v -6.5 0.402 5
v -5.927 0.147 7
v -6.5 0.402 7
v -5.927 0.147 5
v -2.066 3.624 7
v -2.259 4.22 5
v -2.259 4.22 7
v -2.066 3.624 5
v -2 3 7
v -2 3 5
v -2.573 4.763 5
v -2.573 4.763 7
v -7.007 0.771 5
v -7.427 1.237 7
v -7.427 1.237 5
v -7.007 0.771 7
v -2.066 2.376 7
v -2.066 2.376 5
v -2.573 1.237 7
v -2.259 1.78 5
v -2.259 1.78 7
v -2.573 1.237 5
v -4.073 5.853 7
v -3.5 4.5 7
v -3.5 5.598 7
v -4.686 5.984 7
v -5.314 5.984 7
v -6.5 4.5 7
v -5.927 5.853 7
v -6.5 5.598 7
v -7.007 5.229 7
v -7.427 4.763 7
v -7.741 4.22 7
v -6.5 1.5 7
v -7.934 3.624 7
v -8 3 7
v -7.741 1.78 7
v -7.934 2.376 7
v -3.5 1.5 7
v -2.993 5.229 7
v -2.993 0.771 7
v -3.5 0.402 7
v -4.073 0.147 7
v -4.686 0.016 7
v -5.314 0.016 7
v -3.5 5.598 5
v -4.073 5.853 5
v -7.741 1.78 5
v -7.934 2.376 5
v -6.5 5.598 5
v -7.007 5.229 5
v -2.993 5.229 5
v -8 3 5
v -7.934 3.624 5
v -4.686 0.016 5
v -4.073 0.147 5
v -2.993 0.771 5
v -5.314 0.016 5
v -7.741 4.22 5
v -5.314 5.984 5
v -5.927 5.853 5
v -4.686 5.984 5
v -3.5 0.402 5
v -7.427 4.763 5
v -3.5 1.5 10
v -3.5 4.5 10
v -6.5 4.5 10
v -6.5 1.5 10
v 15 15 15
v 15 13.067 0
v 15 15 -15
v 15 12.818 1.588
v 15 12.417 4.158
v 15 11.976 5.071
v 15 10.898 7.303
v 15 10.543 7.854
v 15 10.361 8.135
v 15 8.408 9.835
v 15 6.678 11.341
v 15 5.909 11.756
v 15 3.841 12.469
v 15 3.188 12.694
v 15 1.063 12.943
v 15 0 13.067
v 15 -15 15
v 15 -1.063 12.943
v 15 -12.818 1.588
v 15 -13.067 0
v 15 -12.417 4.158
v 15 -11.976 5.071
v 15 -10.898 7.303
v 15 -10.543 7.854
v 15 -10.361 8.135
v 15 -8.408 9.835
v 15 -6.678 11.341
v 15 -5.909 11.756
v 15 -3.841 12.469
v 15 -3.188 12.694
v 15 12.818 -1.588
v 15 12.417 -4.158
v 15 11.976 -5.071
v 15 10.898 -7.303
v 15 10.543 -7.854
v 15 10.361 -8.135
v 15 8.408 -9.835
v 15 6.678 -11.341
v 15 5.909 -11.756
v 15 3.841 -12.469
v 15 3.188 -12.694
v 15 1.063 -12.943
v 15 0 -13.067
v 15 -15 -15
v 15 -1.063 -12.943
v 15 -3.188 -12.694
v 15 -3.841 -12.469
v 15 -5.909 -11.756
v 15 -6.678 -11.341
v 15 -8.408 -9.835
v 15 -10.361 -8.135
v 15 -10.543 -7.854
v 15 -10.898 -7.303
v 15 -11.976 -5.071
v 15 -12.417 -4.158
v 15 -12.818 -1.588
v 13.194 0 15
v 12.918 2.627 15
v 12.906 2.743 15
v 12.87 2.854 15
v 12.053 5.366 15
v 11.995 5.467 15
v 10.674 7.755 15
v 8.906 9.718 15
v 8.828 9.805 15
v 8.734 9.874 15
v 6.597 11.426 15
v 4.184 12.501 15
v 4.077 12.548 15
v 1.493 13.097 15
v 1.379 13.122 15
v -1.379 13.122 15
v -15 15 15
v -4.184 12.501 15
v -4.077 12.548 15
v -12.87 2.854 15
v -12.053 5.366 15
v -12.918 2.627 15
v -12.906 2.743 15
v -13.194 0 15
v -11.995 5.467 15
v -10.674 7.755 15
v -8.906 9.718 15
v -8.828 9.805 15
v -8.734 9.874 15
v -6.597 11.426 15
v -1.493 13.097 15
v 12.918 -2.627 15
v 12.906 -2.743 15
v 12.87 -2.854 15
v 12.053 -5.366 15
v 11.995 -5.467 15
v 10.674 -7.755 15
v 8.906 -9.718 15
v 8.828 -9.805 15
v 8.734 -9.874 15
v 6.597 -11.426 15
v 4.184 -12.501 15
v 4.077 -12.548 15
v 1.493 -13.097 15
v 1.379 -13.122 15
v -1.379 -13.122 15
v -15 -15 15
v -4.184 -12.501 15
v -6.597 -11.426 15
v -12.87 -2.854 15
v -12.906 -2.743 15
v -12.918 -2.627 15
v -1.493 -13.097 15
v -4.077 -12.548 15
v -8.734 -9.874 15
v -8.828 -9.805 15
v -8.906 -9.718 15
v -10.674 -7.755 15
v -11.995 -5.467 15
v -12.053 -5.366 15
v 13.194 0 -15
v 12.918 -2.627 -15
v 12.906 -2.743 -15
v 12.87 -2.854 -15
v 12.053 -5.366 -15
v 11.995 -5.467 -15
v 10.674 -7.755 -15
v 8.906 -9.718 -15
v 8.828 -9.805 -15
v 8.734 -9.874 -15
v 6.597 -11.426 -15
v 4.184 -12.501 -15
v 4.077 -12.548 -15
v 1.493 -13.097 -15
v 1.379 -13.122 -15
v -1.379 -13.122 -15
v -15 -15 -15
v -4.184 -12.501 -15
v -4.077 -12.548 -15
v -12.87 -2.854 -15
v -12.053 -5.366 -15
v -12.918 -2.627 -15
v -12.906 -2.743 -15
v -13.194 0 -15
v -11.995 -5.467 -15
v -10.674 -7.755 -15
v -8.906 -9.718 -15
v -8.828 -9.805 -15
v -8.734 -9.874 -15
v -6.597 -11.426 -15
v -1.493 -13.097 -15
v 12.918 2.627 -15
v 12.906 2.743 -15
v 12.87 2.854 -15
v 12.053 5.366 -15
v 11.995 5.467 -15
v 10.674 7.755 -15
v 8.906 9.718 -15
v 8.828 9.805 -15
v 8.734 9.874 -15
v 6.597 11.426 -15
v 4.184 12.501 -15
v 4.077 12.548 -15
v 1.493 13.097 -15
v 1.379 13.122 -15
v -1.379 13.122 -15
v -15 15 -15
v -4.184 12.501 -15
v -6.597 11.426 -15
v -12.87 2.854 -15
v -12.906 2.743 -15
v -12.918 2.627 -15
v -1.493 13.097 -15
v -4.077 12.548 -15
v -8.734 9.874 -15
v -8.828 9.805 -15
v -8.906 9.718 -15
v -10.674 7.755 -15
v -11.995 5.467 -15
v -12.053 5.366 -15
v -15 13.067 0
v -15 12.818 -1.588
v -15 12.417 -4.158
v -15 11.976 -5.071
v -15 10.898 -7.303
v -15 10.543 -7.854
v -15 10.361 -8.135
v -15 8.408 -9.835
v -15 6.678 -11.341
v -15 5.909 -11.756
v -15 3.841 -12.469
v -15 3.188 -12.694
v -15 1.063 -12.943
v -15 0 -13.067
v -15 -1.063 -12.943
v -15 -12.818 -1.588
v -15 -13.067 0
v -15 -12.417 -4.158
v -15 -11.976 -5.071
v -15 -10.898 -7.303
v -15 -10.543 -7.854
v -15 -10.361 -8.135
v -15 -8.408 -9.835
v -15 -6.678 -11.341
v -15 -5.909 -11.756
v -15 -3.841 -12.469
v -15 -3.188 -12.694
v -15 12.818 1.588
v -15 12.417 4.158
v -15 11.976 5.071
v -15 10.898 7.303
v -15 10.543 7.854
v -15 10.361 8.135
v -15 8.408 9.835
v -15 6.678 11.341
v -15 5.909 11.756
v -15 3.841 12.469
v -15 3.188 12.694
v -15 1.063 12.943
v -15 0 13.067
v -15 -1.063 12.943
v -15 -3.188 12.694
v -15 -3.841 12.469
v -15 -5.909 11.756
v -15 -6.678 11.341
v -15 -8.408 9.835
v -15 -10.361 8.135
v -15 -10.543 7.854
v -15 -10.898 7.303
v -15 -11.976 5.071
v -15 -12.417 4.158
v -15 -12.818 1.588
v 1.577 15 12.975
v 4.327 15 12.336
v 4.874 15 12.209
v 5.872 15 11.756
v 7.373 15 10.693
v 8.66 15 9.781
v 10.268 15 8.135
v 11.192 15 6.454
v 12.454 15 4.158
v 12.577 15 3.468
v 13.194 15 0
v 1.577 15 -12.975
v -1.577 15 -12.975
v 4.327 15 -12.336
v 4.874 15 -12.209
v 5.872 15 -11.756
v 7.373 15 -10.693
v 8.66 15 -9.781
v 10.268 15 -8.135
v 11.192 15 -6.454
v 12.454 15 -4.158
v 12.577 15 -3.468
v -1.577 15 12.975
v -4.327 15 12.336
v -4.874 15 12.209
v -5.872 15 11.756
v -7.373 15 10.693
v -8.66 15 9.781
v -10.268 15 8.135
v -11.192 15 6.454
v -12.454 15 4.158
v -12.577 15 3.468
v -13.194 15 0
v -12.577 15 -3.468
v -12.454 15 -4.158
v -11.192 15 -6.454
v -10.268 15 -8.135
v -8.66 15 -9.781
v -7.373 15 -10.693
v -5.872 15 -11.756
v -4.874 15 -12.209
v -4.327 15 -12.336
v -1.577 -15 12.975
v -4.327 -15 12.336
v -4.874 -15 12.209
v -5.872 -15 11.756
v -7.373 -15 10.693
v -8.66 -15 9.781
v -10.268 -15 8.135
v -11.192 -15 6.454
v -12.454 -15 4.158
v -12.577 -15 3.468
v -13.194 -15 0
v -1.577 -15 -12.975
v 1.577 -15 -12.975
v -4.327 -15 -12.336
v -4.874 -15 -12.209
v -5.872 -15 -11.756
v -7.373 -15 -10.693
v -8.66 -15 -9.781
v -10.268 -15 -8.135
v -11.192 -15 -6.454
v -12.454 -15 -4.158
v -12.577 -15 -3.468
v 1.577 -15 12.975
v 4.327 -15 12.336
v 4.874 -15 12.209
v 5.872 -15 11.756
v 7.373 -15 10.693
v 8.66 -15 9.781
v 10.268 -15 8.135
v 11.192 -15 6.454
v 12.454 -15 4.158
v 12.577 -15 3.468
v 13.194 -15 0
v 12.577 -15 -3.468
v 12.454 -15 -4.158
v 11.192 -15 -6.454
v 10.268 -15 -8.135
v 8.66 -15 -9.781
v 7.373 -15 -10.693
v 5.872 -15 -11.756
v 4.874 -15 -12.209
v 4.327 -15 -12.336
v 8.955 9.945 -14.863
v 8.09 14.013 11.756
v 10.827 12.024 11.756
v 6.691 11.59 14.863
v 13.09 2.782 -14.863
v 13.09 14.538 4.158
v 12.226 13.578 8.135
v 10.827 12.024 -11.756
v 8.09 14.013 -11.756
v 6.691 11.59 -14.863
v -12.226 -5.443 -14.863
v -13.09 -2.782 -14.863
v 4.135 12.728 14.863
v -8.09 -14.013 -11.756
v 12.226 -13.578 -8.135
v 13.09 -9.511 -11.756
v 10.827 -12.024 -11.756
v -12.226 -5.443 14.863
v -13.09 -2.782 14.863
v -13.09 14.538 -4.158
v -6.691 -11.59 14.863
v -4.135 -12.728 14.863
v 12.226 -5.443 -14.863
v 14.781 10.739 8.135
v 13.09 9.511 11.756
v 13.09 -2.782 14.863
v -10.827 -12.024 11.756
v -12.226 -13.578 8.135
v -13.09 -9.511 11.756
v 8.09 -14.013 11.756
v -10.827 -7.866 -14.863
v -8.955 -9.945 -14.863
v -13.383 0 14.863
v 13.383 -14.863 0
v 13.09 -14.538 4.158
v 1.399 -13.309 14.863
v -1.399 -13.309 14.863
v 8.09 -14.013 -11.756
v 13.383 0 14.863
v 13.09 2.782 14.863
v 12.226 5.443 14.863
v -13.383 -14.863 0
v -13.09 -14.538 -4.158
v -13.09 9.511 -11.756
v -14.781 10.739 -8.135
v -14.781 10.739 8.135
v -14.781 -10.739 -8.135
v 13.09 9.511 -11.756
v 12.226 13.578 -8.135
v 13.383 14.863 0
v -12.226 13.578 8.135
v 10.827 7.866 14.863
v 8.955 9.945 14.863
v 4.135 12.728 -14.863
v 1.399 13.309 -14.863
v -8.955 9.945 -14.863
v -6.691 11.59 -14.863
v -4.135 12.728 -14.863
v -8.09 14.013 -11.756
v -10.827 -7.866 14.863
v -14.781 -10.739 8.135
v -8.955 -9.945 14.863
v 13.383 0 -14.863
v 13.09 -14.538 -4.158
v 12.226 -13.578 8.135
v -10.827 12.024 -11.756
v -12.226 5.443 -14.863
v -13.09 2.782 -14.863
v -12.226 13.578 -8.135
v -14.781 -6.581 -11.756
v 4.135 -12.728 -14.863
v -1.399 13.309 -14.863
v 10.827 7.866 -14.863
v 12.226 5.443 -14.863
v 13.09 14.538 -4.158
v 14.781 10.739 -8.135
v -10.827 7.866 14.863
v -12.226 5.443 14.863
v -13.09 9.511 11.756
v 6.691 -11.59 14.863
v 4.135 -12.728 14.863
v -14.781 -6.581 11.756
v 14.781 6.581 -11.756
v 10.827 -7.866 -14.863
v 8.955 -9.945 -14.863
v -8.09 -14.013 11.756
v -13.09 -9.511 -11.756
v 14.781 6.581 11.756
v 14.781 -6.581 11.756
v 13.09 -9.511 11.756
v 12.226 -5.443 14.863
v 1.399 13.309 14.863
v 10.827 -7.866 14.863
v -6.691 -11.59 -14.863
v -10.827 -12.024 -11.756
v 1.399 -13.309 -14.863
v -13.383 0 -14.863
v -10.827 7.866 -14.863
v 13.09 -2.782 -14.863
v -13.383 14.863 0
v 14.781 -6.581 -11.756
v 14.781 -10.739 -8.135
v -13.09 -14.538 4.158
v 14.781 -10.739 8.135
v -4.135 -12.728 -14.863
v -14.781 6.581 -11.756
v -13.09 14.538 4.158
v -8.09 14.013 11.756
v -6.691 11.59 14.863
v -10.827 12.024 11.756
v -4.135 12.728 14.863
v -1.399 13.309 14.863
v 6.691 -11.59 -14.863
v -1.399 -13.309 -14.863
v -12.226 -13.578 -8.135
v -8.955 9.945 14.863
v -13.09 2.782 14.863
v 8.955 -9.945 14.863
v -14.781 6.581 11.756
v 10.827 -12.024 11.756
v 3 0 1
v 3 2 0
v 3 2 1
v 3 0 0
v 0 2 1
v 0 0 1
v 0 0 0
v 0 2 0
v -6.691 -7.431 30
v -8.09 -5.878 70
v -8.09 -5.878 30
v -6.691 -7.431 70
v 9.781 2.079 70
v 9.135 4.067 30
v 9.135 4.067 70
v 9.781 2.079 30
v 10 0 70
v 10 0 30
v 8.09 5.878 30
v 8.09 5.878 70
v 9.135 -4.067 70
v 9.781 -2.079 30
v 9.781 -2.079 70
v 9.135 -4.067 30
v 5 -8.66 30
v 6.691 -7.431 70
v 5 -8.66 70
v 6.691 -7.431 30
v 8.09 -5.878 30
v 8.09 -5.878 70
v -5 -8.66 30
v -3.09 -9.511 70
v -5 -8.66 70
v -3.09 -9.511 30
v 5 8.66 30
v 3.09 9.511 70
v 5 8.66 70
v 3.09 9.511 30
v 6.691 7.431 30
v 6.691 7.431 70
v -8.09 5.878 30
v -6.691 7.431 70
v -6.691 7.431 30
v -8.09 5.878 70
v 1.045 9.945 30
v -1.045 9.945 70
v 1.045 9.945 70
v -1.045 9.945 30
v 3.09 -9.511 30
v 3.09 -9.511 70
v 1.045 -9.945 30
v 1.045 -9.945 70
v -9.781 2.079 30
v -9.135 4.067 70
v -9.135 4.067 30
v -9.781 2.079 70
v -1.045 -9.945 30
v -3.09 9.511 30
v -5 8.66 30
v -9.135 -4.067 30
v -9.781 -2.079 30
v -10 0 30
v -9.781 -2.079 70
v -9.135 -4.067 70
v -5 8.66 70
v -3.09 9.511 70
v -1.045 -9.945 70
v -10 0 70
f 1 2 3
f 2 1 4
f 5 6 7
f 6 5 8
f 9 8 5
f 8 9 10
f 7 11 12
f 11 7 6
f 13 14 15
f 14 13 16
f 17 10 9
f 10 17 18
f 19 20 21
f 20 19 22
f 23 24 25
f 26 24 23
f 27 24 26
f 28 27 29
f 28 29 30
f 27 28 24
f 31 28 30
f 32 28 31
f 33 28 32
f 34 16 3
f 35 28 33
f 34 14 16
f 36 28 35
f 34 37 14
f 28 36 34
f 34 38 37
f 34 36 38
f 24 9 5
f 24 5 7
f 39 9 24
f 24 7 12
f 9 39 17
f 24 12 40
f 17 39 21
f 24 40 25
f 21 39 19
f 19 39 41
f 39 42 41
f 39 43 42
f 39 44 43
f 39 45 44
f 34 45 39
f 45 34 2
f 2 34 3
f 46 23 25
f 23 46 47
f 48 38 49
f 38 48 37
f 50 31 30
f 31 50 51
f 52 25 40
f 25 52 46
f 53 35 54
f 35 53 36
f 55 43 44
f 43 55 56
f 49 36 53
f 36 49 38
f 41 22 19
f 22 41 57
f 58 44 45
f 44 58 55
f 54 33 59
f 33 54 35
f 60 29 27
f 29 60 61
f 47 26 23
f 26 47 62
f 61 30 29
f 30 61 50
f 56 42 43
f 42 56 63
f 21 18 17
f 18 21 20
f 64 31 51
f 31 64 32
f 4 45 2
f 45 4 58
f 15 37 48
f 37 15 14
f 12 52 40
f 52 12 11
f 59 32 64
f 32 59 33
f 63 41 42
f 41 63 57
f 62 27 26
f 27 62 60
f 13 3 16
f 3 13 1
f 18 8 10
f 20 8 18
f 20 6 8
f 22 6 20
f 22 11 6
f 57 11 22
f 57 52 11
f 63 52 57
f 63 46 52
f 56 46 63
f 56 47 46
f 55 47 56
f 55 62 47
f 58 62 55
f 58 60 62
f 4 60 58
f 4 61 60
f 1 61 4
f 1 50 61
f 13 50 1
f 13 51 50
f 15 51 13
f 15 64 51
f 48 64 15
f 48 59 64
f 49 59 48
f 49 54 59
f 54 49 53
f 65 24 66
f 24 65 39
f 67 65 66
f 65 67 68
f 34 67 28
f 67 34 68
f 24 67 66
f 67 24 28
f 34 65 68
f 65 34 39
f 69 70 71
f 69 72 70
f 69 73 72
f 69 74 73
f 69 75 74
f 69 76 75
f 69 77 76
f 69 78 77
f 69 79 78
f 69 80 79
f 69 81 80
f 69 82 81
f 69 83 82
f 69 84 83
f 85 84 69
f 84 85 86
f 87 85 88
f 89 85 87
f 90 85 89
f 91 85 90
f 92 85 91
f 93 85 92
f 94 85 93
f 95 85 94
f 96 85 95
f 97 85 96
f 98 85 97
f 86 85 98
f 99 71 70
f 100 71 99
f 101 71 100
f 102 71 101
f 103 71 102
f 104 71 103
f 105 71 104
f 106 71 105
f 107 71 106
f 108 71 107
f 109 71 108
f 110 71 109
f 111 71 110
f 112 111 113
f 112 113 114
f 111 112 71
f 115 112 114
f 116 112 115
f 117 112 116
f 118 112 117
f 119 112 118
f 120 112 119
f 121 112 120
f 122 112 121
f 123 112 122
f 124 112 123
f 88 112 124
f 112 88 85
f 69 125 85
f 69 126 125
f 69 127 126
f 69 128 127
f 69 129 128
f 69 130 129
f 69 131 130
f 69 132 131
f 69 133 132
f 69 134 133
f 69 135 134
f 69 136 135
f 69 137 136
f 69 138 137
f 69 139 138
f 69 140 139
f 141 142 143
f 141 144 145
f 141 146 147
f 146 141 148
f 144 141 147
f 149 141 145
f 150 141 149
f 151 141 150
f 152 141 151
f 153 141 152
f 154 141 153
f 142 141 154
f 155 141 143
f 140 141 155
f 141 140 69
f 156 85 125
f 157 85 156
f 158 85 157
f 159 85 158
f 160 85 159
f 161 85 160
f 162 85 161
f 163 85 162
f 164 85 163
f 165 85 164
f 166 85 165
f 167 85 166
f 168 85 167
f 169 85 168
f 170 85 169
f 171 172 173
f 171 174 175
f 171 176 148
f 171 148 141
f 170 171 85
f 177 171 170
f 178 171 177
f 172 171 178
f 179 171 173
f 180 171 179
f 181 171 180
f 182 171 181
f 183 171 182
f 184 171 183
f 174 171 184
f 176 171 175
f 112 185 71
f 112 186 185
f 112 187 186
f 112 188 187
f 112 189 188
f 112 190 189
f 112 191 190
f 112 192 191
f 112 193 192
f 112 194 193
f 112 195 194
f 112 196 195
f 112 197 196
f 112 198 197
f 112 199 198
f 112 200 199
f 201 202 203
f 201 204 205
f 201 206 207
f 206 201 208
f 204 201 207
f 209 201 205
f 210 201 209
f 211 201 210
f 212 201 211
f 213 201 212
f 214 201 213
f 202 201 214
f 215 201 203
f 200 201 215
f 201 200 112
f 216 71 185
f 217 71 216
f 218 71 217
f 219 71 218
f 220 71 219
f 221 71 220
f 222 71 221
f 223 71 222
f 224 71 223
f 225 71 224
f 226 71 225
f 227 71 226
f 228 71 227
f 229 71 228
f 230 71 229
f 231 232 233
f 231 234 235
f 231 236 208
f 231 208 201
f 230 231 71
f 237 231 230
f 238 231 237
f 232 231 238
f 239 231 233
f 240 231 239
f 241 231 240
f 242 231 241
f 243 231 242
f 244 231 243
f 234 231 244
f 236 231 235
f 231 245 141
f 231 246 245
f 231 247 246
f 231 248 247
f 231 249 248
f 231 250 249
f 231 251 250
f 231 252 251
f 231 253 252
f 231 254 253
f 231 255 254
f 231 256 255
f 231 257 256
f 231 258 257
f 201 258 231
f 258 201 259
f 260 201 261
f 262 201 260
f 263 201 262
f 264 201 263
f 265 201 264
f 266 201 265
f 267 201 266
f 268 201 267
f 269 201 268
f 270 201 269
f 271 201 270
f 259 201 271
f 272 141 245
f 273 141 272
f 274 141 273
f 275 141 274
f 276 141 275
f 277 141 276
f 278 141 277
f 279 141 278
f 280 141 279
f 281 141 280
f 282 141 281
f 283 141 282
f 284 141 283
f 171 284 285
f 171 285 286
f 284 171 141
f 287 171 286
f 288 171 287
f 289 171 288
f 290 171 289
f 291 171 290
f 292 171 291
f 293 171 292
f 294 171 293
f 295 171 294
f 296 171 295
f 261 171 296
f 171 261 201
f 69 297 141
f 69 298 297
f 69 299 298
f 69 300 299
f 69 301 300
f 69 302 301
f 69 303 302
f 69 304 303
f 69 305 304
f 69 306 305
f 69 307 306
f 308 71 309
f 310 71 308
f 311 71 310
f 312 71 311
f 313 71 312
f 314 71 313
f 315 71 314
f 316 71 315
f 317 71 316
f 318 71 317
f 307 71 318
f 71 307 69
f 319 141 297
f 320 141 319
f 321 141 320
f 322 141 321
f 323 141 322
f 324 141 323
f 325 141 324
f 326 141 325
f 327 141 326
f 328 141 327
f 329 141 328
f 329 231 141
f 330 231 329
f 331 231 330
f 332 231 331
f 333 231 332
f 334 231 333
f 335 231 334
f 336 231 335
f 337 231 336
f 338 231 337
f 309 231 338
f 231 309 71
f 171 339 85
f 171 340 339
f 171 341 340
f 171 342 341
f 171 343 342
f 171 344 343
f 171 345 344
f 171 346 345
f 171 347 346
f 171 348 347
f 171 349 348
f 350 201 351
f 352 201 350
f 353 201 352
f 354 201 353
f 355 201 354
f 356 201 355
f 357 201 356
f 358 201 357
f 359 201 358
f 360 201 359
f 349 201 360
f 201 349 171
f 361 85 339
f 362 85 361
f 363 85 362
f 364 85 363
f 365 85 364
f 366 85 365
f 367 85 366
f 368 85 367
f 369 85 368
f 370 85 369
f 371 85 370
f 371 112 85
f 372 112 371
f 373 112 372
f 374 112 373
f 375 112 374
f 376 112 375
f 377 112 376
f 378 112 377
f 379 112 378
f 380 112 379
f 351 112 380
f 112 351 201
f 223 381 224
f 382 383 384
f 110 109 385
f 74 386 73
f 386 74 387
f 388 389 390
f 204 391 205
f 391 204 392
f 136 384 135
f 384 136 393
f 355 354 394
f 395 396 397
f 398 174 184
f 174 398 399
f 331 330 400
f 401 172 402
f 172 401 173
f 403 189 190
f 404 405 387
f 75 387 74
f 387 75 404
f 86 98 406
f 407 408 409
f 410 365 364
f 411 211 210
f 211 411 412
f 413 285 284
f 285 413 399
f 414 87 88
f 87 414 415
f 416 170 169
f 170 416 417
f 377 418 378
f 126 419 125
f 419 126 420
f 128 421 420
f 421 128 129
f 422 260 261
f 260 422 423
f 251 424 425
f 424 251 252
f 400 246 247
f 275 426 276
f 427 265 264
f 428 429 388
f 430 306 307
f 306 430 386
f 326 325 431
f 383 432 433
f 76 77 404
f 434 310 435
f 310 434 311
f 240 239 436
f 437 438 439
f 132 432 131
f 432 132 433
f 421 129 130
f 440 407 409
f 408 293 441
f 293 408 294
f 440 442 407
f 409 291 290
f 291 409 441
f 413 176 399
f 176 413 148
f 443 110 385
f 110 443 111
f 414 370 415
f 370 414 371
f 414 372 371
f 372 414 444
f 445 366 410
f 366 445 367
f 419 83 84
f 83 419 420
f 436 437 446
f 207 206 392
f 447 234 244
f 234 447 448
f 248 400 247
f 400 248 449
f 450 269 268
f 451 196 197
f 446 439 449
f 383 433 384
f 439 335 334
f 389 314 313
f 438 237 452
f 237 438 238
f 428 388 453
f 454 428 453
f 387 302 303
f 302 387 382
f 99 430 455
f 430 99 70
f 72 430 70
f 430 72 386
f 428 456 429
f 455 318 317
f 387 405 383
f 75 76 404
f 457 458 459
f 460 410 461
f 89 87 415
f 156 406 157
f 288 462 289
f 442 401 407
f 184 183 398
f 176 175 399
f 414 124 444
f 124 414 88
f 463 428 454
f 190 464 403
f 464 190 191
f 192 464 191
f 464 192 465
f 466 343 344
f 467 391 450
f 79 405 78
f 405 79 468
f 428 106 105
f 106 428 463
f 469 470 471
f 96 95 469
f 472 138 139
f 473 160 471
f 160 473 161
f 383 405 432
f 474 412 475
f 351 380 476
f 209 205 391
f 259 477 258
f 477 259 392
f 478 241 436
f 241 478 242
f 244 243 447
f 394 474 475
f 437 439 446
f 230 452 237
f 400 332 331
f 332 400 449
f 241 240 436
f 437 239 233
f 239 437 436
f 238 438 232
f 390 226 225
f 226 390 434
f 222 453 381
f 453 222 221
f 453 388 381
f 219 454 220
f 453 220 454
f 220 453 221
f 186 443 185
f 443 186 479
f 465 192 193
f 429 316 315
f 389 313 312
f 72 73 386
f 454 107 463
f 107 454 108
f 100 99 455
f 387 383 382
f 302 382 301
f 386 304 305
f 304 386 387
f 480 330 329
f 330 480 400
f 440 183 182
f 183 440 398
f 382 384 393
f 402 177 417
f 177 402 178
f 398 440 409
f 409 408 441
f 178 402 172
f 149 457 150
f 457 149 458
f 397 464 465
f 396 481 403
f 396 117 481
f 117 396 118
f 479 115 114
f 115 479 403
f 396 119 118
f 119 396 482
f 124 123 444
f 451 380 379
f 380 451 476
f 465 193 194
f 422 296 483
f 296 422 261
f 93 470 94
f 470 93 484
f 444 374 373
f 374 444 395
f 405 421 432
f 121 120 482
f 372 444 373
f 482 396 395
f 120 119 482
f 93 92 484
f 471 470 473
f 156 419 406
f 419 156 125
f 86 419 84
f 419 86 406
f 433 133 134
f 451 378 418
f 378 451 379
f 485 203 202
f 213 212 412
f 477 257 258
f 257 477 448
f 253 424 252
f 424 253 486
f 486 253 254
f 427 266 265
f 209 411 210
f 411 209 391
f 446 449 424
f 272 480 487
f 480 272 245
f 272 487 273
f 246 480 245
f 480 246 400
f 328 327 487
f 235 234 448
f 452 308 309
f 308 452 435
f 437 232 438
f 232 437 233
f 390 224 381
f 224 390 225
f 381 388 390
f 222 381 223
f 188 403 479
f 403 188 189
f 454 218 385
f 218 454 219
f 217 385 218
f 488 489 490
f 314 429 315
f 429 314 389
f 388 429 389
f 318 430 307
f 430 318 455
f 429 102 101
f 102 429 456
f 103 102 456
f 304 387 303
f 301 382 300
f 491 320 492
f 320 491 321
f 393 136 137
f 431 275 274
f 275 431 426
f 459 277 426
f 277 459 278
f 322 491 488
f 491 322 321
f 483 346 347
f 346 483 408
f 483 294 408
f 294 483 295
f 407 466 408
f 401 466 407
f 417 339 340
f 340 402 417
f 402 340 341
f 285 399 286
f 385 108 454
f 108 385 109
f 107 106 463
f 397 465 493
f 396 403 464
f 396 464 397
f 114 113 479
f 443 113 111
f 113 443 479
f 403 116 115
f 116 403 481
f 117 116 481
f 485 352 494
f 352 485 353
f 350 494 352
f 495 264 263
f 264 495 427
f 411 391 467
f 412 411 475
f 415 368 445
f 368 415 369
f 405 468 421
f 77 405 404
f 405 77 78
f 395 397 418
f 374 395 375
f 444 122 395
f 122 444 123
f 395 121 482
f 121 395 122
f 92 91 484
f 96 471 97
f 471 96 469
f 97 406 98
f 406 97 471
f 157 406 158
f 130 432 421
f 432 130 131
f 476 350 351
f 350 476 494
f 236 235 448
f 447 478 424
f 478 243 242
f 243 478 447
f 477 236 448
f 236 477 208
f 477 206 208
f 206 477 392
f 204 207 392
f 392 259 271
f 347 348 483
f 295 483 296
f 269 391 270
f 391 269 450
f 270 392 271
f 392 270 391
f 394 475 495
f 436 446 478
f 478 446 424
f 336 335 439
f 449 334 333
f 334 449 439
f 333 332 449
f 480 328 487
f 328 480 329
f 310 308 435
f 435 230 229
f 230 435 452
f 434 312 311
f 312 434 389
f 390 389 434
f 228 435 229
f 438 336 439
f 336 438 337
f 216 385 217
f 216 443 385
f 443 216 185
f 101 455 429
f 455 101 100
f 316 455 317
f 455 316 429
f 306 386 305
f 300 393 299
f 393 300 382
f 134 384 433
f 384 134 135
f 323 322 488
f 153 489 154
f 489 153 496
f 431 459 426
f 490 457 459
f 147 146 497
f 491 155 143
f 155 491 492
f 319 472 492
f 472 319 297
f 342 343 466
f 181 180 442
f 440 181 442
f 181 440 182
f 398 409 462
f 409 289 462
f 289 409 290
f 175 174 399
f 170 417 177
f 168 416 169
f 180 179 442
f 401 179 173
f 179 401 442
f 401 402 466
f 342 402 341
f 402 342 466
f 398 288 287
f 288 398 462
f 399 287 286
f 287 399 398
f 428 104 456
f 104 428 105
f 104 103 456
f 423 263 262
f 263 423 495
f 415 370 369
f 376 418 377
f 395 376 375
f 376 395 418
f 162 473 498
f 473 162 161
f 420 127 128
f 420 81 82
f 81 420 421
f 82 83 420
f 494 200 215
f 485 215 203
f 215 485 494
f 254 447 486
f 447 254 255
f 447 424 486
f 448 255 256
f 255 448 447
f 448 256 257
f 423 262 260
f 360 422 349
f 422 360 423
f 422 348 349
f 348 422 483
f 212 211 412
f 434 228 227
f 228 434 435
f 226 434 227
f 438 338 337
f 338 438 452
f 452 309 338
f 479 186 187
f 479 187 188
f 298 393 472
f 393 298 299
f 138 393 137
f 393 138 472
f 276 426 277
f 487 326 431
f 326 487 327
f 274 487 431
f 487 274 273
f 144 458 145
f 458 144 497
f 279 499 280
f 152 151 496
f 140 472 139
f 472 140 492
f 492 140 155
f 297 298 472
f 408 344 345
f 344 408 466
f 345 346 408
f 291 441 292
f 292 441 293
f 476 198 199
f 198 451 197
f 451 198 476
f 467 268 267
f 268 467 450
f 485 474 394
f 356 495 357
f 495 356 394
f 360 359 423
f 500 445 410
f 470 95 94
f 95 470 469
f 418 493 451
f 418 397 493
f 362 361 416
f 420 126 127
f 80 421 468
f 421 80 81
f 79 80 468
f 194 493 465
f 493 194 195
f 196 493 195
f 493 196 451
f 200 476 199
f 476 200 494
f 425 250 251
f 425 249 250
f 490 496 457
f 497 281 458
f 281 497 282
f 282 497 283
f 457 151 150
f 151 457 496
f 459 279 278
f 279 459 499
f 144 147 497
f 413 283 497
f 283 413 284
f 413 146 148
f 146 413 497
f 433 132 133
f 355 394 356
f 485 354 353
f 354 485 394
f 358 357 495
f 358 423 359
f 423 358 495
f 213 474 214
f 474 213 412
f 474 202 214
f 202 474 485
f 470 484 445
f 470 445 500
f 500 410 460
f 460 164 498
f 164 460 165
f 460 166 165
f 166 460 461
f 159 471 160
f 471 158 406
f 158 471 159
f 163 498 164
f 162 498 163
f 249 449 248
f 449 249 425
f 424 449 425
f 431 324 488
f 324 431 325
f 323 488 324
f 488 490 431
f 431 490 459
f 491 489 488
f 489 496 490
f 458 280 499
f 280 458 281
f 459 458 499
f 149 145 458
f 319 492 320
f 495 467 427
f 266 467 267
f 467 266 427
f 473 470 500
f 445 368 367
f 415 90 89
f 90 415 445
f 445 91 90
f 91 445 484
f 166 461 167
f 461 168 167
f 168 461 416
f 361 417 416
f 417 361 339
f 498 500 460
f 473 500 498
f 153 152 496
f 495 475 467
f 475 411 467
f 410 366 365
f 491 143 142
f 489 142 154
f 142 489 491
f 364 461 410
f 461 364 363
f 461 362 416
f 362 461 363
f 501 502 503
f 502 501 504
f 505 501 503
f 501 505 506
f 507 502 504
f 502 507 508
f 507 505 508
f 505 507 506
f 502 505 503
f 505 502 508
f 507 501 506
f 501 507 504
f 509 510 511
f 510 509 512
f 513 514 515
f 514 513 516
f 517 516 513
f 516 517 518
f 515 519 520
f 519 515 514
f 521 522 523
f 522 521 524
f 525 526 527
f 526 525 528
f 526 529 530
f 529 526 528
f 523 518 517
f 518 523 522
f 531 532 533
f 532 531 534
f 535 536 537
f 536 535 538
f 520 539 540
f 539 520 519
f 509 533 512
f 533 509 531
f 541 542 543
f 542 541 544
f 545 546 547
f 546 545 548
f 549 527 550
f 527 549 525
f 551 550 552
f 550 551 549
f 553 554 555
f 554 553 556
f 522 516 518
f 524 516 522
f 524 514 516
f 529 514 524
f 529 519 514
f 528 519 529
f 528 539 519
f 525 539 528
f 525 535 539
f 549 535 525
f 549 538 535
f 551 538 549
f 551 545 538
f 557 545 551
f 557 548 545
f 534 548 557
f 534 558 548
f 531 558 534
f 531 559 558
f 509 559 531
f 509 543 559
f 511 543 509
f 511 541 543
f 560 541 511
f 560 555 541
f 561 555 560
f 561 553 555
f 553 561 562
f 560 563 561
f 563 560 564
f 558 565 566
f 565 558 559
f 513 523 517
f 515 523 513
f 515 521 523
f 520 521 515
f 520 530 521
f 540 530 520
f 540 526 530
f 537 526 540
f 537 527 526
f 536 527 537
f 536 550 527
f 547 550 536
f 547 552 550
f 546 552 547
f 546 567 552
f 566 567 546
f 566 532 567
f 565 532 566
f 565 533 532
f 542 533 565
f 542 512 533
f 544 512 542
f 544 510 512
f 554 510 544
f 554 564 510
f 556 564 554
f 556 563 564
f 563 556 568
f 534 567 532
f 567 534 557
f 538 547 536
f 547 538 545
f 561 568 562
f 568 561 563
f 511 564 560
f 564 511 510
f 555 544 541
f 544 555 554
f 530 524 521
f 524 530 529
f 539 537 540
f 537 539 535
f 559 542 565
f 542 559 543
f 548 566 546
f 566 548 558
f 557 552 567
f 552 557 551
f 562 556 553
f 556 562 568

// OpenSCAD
//$res=2;
$fs=0.2;

color([1,0,0])
cube([3,2,1]);

translate([-5,3,5]){
  color([1,0,0])
cylinder(r=3, h=2);
    color([0.5,1,1])
    translate([-1.5,-1.5,0])
cube ([3,3,5]);
}


difference() {
    cube(30, center=true);
    sphere(20);
}
translate([0, 0, 30]) {
    cylinder(h=40, r=10);
}
